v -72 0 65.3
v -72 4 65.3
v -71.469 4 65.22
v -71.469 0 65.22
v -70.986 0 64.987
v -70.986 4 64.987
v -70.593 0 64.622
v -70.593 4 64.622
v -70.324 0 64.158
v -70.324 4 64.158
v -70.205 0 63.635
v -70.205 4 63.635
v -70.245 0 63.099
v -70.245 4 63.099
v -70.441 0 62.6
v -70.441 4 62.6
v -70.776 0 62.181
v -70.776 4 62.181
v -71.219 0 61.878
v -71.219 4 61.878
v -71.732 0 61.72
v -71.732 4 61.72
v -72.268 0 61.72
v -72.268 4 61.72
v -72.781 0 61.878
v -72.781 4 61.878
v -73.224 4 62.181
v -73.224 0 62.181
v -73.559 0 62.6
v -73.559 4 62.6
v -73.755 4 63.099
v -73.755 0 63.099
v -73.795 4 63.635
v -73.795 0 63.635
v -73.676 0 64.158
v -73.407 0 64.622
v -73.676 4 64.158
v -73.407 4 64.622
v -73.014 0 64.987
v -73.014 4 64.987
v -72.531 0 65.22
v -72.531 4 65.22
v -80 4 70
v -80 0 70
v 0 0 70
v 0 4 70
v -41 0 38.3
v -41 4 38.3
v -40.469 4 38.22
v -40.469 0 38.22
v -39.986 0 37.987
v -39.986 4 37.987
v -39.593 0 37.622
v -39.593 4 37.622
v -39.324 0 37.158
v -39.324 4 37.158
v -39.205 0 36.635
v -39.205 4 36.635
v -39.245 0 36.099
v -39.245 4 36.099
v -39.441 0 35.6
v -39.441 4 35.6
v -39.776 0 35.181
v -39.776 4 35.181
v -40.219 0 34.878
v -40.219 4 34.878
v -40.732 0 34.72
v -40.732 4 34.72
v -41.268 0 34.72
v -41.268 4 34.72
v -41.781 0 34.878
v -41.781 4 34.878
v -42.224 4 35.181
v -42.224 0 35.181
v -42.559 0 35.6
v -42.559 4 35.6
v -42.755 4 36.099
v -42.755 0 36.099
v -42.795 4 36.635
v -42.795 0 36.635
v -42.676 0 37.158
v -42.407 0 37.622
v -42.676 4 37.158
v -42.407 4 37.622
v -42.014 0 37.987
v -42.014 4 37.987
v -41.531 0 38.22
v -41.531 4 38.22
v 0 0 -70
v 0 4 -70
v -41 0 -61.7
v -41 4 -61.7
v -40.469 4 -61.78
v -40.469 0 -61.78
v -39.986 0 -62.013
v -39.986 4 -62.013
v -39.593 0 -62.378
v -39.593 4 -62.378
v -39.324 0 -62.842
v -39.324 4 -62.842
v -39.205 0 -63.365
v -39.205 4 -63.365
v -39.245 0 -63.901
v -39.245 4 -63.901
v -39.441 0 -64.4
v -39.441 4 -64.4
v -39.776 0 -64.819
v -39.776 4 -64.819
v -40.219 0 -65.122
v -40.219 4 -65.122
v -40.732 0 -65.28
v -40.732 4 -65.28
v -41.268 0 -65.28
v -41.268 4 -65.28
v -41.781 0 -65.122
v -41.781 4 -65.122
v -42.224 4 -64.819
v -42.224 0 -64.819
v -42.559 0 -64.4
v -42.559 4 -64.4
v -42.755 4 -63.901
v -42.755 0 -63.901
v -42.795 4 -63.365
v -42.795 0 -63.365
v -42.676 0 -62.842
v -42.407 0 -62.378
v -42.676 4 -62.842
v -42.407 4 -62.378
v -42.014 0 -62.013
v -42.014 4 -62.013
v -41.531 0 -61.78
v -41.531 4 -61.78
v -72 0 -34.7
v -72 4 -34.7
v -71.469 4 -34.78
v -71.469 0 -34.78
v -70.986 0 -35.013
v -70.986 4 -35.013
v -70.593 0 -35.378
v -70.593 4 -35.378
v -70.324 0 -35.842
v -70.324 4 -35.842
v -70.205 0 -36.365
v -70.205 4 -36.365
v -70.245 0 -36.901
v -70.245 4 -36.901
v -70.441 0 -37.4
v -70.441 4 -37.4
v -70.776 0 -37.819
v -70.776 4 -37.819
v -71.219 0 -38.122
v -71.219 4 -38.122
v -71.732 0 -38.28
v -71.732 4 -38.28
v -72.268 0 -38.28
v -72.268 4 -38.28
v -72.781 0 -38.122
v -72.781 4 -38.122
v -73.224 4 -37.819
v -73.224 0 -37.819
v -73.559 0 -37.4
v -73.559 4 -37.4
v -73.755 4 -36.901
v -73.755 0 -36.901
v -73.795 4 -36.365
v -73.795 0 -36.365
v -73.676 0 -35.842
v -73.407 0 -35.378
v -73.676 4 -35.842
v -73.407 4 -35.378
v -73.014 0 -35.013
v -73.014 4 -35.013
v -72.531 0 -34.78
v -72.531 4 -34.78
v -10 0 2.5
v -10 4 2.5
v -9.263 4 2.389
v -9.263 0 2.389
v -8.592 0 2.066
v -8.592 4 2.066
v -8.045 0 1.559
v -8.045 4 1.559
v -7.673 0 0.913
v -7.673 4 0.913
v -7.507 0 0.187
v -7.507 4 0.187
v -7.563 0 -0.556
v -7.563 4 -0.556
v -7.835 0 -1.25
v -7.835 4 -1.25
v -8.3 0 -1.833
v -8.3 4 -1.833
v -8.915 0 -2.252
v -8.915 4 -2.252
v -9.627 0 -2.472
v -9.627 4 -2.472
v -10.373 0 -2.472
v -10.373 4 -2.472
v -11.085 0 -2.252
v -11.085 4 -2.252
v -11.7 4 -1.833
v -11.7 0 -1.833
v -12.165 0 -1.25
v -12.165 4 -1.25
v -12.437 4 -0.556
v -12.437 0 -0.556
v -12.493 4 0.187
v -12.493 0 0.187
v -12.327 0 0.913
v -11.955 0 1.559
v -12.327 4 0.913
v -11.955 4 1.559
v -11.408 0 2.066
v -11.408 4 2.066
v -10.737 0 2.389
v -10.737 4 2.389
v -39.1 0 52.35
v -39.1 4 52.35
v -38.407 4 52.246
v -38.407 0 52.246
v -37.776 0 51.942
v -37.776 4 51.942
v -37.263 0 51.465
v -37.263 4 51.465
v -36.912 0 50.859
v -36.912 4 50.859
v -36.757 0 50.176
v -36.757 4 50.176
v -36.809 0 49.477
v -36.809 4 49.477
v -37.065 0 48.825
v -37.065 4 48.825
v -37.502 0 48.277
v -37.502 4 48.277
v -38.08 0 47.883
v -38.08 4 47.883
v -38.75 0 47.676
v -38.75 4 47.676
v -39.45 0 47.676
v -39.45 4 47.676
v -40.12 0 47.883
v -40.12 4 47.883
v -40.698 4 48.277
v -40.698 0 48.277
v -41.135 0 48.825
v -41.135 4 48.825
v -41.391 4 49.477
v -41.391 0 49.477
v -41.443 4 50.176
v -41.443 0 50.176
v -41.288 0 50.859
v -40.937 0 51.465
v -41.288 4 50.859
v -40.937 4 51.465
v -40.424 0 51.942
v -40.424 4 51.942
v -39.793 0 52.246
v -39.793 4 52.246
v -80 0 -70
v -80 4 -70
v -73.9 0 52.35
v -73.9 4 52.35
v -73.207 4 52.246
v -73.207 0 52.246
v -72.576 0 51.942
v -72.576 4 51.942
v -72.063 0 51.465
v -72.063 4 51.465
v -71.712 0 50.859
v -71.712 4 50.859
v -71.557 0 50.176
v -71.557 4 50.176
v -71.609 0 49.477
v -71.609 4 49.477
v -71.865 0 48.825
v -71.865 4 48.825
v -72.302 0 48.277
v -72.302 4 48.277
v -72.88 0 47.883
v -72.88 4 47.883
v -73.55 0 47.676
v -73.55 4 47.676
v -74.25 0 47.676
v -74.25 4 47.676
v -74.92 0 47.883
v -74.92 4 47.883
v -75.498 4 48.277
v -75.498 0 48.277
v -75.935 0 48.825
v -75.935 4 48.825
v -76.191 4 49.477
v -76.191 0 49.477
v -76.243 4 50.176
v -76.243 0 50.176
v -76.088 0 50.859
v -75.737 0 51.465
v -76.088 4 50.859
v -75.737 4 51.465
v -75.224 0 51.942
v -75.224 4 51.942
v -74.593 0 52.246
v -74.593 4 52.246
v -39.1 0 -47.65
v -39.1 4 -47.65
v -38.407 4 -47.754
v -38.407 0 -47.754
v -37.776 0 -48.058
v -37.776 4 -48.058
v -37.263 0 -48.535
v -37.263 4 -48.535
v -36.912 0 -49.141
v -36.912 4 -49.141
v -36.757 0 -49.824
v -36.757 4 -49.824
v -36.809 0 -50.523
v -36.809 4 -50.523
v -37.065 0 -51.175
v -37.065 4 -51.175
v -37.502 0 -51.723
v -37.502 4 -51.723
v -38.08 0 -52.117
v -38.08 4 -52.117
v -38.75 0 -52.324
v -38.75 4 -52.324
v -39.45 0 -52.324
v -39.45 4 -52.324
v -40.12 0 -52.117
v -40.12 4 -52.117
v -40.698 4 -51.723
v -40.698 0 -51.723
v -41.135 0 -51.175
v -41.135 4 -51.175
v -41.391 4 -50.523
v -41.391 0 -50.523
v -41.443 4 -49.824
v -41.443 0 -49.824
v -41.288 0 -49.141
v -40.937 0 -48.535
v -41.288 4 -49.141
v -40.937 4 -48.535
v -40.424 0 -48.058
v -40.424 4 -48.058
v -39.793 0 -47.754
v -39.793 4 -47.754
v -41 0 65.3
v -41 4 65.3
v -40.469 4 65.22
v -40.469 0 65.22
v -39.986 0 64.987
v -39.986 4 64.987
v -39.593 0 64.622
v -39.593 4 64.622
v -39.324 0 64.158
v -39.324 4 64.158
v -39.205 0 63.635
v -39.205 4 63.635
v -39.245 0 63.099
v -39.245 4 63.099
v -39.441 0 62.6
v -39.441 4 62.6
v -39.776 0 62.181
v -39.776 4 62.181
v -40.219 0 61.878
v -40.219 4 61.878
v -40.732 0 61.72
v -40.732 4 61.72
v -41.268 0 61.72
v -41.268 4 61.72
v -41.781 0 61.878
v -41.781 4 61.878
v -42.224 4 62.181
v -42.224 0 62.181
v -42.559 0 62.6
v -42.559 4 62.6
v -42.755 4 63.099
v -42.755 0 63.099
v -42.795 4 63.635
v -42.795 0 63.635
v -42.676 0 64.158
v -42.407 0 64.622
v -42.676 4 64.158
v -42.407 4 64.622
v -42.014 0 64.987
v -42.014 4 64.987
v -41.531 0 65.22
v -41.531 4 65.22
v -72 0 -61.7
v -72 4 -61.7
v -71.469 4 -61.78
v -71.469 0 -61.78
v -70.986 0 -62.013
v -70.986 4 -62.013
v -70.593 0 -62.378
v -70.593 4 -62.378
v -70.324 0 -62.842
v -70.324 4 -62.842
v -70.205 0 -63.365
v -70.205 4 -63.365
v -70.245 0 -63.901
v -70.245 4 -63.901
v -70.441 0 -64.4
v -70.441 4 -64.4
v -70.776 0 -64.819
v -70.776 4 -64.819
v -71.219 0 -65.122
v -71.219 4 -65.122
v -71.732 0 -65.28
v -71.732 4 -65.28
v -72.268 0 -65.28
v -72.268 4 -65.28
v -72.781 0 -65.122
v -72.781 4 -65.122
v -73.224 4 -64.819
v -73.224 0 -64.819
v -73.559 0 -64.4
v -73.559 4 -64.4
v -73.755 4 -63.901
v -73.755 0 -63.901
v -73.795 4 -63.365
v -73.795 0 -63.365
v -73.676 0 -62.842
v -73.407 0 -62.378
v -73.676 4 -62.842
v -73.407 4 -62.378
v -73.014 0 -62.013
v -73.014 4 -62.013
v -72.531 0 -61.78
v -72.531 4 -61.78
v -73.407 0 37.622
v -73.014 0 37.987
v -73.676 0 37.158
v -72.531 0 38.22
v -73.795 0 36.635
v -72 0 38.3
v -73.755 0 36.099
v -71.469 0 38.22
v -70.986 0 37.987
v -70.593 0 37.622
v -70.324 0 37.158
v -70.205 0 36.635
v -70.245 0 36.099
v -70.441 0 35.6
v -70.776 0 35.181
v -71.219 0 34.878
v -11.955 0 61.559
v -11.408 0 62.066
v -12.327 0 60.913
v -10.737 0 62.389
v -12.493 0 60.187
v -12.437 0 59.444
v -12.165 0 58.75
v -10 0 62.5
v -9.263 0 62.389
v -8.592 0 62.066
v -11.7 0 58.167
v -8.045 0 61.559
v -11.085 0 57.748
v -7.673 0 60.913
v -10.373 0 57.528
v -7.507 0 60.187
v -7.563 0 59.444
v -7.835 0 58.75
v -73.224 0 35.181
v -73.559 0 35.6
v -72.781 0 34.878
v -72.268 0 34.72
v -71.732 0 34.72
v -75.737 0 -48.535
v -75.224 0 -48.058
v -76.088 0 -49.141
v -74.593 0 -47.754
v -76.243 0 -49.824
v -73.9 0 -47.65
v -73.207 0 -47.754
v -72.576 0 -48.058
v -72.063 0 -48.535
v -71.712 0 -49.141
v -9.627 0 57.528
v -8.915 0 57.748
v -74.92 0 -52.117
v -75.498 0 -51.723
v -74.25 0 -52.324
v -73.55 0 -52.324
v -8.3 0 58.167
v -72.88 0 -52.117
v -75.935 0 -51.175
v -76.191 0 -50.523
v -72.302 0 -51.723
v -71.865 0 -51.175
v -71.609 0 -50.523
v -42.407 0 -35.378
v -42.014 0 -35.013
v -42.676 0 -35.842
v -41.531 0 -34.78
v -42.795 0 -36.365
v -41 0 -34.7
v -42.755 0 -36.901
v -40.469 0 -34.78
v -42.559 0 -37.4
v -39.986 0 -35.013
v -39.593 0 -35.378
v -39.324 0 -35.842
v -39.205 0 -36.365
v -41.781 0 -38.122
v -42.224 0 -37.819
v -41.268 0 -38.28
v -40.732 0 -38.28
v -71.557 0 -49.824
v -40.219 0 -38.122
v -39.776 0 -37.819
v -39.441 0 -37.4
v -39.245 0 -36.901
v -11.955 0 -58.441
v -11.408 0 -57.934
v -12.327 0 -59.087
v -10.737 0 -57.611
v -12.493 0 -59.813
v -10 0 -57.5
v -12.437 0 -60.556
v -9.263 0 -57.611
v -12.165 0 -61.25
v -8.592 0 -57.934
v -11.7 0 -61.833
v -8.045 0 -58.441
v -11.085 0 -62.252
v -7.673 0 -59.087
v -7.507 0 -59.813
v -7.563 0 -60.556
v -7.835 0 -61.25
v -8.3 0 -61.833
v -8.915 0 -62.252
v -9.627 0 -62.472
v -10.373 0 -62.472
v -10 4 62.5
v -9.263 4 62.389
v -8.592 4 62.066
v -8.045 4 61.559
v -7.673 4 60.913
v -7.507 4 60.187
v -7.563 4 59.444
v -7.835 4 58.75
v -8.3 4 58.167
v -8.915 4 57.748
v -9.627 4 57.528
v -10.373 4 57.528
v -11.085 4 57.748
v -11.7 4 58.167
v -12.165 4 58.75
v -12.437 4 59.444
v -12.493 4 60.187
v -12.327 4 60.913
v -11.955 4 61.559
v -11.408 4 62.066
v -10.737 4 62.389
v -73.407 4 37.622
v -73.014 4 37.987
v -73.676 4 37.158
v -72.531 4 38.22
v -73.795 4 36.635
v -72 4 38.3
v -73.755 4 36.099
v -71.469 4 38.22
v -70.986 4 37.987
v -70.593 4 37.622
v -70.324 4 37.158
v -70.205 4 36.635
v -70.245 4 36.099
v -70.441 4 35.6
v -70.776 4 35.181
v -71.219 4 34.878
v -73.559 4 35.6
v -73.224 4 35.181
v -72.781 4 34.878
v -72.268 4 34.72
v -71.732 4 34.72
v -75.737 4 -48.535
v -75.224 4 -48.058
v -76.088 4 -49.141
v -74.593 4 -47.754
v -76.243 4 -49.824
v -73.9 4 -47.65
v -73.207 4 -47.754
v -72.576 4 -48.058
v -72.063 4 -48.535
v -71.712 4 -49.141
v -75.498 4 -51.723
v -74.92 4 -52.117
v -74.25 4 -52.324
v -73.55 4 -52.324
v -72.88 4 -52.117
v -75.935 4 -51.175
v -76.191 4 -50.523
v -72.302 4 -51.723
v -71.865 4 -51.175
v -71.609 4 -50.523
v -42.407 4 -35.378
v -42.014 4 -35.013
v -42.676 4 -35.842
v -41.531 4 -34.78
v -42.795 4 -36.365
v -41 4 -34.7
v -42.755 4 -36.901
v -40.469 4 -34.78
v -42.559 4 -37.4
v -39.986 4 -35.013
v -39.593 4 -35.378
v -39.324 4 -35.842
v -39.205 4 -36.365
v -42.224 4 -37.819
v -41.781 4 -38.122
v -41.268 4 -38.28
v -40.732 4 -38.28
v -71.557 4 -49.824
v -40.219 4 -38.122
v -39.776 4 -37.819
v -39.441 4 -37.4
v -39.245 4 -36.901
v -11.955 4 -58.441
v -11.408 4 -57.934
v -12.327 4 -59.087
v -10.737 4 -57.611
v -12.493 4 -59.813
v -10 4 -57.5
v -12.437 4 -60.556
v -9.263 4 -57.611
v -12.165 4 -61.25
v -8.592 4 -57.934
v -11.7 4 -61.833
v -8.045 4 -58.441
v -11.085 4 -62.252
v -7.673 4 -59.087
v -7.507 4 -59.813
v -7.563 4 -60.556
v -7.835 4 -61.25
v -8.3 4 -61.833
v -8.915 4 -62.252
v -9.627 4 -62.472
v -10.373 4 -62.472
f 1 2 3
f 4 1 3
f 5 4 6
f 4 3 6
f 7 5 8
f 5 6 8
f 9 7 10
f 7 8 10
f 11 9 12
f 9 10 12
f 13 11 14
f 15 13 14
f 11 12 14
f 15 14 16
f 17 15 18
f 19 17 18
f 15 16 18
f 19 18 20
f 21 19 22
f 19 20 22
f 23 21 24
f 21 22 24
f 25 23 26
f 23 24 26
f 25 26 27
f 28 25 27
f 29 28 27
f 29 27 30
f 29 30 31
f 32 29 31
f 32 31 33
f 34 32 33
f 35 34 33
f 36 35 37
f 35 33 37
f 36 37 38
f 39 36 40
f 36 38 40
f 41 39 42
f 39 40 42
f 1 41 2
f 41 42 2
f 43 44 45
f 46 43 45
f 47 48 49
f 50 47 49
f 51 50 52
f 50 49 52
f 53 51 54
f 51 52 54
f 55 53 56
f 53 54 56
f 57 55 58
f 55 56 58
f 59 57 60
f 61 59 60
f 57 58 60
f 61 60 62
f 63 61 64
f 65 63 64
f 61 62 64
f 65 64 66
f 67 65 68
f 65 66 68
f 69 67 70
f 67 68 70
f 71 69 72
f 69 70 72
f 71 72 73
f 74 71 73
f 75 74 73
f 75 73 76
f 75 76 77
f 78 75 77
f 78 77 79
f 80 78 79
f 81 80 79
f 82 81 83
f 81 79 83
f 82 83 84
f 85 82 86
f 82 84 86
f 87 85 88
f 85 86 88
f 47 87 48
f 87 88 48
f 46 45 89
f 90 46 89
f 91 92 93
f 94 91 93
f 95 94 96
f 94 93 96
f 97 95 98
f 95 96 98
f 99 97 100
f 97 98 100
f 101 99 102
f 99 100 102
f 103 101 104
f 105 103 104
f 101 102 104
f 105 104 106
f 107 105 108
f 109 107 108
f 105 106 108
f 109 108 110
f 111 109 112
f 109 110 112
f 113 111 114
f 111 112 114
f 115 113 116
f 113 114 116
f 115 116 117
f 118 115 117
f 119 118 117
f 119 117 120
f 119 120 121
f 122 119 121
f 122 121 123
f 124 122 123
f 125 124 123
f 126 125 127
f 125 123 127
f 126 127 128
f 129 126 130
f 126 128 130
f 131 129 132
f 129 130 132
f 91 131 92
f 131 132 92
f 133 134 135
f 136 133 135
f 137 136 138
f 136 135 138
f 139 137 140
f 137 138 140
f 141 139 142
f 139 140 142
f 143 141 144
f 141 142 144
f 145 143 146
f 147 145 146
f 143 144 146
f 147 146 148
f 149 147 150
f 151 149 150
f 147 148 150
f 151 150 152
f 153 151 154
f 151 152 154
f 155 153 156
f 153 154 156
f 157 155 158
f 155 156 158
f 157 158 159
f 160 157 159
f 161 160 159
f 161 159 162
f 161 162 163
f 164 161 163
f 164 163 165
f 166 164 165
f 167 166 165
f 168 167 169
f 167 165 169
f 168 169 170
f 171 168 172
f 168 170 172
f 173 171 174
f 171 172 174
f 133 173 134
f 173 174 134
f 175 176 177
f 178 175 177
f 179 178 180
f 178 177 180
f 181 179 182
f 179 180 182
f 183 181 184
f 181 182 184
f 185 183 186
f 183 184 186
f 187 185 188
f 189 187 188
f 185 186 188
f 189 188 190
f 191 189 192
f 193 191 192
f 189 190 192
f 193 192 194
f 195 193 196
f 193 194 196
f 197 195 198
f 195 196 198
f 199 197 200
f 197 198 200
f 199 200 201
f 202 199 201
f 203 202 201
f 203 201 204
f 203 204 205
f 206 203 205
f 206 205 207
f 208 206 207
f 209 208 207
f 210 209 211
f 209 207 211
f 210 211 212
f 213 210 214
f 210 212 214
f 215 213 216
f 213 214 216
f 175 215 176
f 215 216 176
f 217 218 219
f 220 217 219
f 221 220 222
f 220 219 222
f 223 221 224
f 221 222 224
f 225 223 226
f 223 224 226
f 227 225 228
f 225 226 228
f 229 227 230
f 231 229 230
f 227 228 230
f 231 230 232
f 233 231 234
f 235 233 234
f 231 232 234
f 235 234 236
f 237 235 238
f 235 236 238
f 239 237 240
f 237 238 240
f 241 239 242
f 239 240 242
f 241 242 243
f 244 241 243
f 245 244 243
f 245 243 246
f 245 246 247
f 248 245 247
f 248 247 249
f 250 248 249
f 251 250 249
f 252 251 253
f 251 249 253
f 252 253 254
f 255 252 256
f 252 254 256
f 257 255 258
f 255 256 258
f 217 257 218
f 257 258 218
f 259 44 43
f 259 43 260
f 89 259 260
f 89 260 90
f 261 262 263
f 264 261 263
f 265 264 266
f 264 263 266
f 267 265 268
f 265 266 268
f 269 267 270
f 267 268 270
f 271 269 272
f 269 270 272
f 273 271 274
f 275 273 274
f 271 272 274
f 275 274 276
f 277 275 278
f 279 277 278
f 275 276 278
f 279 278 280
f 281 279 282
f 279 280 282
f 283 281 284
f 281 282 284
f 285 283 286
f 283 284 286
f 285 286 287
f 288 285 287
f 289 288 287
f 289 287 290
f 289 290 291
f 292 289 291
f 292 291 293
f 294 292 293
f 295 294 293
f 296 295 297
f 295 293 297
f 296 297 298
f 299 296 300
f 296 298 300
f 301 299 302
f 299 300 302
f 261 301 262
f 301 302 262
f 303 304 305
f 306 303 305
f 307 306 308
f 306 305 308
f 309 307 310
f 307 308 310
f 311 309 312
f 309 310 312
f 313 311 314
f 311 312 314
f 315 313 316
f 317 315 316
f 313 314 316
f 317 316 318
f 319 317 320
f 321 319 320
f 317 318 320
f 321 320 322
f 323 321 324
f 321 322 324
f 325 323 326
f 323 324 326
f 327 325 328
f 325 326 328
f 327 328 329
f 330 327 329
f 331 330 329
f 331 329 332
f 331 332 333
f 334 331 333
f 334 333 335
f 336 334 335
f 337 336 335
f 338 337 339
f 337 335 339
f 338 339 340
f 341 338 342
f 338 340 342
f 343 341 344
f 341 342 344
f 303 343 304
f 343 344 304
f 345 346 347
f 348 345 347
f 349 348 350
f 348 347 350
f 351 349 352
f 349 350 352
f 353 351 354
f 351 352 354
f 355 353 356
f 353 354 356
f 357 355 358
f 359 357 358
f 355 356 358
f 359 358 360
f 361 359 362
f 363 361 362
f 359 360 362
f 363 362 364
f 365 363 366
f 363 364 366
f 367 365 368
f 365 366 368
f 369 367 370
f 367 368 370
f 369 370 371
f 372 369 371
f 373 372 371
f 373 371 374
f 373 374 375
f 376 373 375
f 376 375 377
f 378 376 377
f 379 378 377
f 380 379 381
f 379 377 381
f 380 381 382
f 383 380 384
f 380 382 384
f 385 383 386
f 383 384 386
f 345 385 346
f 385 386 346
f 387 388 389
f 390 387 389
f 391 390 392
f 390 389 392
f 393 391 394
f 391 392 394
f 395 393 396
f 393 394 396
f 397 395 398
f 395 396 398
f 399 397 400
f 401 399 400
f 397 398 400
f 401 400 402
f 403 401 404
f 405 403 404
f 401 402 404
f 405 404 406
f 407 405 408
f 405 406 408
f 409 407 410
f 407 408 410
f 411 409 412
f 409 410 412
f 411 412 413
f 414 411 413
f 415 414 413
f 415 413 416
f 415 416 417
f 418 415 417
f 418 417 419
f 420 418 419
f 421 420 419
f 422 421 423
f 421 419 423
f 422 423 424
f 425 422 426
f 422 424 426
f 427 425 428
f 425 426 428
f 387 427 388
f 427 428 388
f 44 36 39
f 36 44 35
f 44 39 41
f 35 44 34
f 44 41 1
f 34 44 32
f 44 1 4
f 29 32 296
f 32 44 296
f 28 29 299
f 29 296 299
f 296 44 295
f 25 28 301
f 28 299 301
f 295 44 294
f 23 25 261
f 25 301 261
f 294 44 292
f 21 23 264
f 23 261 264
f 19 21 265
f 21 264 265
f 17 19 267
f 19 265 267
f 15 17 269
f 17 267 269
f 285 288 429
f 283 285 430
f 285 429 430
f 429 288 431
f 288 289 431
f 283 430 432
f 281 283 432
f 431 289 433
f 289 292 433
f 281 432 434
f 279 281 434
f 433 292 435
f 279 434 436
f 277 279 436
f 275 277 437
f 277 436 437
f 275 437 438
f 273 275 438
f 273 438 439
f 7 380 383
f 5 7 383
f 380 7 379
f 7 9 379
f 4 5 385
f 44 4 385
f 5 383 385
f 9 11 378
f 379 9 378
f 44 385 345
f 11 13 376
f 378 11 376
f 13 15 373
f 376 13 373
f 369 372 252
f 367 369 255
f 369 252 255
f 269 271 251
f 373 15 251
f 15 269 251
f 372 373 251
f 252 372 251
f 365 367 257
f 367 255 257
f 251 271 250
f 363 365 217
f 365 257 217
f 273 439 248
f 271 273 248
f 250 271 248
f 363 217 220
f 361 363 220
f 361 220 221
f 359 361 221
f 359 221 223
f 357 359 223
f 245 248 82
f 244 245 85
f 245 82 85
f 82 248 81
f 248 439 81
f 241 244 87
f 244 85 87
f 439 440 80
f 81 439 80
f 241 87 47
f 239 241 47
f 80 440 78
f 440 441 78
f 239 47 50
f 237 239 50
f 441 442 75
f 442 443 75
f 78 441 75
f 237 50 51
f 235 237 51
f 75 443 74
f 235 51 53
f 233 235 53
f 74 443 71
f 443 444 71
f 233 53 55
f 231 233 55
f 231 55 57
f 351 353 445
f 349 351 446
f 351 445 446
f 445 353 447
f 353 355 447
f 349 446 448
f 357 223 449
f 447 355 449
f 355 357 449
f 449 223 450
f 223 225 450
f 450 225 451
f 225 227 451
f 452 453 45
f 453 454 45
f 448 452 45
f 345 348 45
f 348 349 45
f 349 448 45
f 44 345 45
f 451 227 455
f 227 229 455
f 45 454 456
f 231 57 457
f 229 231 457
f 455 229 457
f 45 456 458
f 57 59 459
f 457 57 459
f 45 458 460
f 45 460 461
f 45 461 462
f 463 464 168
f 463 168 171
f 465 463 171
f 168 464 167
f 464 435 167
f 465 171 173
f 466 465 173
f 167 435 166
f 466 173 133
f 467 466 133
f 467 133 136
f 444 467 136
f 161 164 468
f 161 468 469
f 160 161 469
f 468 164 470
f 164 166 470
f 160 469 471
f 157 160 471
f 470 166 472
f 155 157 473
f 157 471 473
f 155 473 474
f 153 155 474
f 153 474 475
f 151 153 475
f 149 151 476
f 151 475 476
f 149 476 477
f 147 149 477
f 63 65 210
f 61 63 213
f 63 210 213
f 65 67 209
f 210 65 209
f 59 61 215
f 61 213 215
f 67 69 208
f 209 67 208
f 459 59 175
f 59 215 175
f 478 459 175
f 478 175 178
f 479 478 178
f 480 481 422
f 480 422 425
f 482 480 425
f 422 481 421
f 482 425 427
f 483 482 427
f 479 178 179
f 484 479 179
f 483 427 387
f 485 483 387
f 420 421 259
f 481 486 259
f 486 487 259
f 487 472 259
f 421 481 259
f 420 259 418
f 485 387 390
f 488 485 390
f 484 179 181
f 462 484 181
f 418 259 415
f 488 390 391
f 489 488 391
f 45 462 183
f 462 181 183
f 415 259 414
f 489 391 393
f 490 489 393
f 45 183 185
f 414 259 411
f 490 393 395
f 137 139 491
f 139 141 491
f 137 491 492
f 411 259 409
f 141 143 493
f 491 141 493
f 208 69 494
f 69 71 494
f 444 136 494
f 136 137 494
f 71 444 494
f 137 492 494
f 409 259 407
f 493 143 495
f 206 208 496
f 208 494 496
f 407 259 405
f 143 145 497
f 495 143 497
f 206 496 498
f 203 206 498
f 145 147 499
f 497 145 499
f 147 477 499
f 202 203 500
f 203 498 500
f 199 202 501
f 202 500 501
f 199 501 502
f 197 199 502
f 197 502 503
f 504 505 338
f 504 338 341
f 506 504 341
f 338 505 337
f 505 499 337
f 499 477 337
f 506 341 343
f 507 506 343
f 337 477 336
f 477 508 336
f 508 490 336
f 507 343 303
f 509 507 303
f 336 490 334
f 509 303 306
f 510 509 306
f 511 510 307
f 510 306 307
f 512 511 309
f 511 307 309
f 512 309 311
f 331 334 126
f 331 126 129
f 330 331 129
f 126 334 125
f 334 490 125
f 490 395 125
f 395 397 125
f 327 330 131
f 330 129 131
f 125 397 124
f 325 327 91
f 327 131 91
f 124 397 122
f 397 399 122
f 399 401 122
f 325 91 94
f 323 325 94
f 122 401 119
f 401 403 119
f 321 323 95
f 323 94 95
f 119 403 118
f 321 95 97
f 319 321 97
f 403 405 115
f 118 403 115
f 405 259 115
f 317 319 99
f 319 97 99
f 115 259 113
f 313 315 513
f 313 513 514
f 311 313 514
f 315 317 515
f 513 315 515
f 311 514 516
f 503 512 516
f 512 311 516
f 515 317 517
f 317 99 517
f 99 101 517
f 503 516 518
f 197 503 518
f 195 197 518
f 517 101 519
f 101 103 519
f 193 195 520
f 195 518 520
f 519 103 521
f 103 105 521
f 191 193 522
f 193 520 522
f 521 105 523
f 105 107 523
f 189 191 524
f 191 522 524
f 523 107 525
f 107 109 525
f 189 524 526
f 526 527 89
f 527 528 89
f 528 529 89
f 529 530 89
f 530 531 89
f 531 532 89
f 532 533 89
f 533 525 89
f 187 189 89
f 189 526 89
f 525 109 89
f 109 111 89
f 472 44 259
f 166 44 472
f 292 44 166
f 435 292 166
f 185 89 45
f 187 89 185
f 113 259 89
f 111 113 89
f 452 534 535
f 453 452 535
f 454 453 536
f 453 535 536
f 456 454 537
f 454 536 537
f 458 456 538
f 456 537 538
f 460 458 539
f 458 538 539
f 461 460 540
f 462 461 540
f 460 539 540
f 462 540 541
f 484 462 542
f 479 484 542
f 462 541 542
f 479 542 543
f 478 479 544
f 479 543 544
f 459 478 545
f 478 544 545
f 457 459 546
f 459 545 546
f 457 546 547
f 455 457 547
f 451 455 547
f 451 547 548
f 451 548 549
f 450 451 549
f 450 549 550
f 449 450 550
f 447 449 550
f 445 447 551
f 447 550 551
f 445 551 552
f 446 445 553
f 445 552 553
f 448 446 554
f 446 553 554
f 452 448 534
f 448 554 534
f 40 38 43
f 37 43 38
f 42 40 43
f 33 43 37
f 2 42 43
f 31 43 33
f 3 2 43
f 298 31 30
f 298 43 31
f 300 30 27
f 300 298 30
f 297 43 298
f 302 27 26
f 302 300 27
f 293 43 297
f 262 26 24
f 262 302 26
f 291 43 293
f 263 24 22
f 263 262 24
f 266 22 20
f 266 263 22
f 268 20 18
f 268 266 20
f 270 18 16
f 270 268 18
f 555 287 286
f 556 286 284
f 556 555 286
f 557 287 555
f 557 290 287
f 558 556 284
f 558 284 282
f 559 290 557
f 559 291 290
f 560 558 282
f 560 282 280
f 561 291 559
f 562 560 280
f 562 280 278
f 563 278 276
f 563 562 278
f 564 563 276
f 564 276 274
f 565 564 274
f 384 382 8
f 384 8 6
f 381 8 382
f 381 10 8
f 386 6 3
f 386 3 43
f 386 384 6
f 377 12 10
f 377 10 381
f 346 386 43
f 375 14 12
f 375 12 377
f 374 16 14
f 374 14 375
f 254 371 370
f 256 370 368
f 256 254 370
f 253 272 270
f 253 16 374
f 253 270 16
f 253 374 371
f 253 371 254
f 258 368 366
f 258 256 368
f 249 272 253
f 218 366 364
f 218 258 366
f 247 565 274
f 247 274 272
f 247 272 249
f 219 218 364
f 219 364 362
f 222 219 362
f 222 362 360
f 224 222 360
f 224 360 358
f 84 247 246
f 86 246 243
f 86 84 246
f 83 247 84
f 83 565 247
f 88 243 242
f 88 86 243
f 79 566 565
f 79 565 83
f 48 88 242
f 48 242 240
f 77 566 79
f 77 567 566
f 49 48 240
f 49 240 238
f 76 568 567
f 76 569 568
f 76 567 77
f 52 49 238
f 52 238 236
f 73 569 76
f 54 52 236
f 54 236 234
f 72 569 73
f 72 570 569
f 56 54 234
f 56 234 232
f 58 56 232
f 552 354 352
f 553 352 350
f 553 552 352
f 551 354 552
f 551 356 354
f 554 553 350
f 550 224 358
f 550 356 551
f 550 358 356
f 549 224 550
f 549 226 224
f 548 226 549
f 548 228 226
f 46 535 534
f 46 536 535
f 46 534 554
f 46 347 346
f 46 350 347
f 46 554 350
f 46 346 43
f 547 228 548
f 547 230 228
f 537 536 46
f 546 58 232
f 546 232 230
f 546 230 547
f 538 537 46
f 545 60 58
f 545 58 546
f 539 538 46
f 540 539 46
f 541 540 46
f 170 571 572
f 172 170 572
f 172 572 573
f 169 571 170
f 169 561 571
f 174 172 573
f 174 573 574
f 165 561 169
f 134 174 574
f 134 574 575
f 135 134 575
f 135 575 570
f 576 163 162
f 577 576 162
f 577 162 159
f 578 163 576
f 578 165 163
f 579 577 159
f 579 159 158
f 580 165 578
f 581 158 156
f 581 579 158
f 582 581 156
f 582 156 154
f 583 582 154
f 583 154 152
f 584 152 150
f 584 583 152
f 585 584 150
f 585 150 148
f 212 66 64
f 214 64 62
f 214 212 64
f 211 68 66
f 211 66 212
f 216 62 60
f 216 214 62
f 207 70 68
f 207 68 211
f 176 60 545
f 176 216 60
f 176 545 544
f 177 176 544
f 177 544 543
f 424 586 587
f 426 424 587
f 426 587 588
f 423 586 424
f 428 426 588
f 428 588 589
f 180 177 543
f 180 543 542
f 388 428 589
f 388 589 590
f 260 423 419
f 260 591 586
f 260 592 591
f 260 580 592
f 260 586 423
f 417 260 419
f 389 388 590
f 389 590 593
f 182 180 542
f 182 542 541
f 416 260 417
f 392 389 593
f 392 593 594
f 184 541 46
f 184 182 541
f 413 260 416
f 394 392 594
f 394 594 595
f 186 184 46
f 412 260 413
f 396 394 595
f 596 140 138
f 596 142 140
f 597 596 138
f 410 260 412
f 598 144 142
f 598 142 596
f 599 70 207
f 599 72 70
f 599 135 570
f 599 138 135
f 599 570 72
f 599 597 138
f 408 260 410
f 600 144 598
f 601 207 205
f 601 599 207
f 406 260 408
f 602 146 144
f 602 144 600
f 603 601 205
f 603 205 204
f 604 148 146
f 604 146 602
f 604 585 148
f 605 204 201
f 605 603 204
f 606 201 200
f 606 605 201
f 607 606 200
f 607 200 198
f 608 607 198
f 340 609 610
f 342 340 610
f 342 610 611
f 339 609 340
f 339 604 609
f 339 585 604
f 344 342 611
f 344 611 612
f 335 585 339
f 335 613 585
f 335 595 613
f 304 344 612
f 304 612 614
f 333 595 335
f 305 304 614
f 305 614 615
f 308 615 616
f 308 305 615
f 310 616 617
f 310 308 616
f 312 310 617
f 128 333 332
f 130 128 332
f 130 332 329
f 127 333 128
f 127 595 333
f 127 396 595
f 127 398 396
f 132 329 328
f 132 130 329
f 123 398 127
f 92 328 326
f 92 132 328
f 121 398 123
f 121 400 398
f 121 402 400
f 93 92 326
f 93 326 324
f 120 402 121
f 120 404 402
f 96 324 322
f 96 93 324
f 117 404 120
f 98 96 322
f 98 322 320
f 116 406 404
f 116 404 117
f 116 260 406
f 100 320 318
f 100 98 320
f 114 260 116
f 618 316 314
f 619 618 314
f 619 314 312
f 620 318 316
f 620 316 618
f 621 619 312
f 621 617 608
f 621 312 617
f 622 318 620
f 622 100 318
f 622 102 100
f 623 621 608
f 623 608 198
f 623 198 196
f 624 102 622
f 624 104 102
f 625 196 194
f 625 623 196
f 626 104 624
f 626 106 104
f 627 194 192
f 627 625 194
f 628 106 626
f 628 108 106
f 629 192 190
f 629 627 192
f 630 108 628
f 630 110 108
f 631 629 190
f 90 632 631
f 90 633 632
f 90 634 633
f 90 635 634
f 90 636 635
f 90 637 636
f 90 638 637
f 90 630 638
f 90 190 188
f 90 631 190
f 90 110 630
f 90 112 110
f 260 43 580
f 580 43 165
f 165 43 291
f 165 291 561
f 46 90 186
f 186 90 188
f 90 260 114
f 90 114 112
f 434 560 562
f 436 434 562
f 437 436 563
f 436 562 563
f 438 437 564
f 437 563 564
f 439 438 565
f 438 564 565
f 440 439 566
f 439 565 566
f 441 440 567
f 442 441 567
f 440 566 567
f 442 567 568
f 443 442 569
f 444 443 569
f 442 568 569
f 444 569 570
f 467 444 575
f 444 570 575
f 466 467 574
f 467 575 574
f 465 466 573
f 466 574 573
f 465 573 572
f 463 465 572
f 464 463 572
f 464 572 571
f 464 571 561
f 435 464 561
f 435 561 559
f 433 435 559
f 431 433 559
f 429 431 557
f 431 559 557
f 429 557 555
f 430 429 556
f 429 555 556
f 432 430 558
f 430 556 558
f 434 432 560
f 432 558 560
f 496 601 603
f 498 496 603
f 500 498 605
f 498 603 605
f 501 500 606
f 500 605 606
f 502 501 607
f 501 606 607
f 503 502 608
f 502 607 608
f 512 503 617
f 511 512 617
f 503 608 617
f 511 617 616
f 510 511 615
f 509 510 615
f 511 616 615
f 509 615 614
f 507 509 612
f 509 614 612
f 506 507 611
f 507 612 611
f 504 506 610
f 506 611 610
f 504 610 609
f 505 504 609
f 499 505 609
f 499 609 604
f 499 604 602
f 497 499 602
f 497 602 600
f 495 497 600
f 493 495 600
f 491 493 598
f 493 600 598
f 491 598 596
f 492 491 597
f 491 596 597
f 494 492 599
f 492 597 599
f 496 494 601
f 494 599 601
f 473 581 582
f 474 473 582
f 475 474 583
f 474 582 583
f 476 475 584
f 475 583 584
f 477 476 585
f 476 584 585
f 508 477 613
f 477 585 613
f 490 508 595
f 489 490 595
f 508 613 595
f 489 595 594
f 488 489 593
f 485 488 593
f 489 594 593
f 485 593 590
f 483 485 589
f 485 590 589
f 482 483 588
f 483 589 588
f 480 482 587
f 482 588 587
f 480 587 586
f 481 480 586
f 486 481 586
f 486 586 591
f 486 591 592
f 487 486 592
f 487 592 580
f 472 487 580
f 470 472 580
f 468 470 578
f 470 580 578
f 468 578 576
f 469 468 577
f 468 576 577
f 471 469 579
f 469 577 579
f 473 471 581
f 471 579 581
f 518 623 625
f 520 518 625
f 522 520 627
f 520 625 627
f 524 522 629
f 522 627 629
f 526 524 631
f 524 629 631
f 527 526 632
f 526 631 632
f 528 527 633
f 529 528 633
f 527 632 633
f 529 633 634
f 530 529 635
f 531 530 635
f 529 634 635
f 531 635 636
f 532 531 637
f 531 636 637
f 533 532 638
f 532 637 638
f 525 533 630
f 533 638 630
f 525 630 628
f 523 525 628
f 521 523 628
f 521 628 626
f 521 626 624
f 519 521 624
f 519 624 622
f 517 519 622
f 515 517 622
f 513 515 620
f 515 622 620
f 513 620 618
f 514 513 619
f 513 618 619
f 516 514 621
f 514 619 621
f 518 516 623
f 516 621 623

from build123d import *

# Parameters (mm, degrees)
SKETCH_2_W          = 80
SKETCH_2_H          = 140
EXTRUDE_1_DEPTH     = 4
SKETCH_3_R          = 1.8
SKETCH_3_R_2        = 2.35
SKETCH_3_R_3        = 2.5
CUT_EXTRUDE_3_DEPTH = 4


with BuildPart() as part:
    # 草图2 → 凸台-拉伸1 (new body)
    with BuildSketch(Plane(origin=(0, 0, 0), x_dir=(1, 0, 0), z_dir=(0, 1, 0))):
        with Locations((-40, 0)):
            Rectangle(SKETCH_2_W, SKETCH_2_H)
    extrude(amount=EXTRUDE_1_DEPTH)

    # 草图3 → 切除-拉伸3 (cut)
    with BuildSketch(Plane(origin=(0, 4, 0), x_dir=(1, 0, 0), z_dir=(0, 1, 0))):
        with Locations(Location((-72, 63.5, 0), (0, 0, 270))):
            Circle(SKETCH_3_R)
        with Locations(Location((-41, 63.5, 0), (0, 0, 270))):
            Circle(SKETCH_3_R)
        with Locations(Location((-41, 36.5, 0), (0, 0, 270))):
            Circle(SKETCH_3_R)
        with Locations(Location((-72, 36.5, 0), (0, 0, 270))):
            Circle(SKETCH_3_R)
        with Locations(Location((-41, -63.5, 0), (0, 0, 270))):
            Circle(SKETCH_3_R)
        with Locations(Location((-41, -36.5, 0), (0, 0, 270))):
            Circle(SKETCH_3_R)
        with Locations(Location((-72, -36.5, 0), (0, 0, 270))):
            Circle(SKETCH_3_R)
        with Locations(Location((-72, -63.5, 0), (0, 0, 270))):
            Circle(SKETCH_3_R)
        with Locations(Location((-73.9, 50, 0), (0, 0, 270))):
            Circle(SKETCH_3_R_2)
        with Locations(Location((-73.9, -50, 0), (0, 0, 270))):
            Circle(SKETCH_3_R_2)
        with Locations(Location((-39.1, -50, 0), (0, 0, 270))):
            Circle(SKETCH_3_R_2)
        with Locations(Location((-39.1, 50, 0), (0, 0, 270))):
            Circle(SKETCH_3_R_2)
        with Locations(Location((-10, 60, 0), (0, 0, 270))):
            Circle(SKETCH_3_R_3)
        with Locations(Location((-10, 0, 0), (0, 0, 270))):
            Circle(SKETCH_3_R_3)
        with Locations(Location((-10, -60, 0), (0, 0, 270))):
            Circle(SKETCH_3_R_3)
    extrude(amount=-CUT_EXTRUDE_3_DEPTH, mode=Mode.SUBTRACT)


solid = part.part
